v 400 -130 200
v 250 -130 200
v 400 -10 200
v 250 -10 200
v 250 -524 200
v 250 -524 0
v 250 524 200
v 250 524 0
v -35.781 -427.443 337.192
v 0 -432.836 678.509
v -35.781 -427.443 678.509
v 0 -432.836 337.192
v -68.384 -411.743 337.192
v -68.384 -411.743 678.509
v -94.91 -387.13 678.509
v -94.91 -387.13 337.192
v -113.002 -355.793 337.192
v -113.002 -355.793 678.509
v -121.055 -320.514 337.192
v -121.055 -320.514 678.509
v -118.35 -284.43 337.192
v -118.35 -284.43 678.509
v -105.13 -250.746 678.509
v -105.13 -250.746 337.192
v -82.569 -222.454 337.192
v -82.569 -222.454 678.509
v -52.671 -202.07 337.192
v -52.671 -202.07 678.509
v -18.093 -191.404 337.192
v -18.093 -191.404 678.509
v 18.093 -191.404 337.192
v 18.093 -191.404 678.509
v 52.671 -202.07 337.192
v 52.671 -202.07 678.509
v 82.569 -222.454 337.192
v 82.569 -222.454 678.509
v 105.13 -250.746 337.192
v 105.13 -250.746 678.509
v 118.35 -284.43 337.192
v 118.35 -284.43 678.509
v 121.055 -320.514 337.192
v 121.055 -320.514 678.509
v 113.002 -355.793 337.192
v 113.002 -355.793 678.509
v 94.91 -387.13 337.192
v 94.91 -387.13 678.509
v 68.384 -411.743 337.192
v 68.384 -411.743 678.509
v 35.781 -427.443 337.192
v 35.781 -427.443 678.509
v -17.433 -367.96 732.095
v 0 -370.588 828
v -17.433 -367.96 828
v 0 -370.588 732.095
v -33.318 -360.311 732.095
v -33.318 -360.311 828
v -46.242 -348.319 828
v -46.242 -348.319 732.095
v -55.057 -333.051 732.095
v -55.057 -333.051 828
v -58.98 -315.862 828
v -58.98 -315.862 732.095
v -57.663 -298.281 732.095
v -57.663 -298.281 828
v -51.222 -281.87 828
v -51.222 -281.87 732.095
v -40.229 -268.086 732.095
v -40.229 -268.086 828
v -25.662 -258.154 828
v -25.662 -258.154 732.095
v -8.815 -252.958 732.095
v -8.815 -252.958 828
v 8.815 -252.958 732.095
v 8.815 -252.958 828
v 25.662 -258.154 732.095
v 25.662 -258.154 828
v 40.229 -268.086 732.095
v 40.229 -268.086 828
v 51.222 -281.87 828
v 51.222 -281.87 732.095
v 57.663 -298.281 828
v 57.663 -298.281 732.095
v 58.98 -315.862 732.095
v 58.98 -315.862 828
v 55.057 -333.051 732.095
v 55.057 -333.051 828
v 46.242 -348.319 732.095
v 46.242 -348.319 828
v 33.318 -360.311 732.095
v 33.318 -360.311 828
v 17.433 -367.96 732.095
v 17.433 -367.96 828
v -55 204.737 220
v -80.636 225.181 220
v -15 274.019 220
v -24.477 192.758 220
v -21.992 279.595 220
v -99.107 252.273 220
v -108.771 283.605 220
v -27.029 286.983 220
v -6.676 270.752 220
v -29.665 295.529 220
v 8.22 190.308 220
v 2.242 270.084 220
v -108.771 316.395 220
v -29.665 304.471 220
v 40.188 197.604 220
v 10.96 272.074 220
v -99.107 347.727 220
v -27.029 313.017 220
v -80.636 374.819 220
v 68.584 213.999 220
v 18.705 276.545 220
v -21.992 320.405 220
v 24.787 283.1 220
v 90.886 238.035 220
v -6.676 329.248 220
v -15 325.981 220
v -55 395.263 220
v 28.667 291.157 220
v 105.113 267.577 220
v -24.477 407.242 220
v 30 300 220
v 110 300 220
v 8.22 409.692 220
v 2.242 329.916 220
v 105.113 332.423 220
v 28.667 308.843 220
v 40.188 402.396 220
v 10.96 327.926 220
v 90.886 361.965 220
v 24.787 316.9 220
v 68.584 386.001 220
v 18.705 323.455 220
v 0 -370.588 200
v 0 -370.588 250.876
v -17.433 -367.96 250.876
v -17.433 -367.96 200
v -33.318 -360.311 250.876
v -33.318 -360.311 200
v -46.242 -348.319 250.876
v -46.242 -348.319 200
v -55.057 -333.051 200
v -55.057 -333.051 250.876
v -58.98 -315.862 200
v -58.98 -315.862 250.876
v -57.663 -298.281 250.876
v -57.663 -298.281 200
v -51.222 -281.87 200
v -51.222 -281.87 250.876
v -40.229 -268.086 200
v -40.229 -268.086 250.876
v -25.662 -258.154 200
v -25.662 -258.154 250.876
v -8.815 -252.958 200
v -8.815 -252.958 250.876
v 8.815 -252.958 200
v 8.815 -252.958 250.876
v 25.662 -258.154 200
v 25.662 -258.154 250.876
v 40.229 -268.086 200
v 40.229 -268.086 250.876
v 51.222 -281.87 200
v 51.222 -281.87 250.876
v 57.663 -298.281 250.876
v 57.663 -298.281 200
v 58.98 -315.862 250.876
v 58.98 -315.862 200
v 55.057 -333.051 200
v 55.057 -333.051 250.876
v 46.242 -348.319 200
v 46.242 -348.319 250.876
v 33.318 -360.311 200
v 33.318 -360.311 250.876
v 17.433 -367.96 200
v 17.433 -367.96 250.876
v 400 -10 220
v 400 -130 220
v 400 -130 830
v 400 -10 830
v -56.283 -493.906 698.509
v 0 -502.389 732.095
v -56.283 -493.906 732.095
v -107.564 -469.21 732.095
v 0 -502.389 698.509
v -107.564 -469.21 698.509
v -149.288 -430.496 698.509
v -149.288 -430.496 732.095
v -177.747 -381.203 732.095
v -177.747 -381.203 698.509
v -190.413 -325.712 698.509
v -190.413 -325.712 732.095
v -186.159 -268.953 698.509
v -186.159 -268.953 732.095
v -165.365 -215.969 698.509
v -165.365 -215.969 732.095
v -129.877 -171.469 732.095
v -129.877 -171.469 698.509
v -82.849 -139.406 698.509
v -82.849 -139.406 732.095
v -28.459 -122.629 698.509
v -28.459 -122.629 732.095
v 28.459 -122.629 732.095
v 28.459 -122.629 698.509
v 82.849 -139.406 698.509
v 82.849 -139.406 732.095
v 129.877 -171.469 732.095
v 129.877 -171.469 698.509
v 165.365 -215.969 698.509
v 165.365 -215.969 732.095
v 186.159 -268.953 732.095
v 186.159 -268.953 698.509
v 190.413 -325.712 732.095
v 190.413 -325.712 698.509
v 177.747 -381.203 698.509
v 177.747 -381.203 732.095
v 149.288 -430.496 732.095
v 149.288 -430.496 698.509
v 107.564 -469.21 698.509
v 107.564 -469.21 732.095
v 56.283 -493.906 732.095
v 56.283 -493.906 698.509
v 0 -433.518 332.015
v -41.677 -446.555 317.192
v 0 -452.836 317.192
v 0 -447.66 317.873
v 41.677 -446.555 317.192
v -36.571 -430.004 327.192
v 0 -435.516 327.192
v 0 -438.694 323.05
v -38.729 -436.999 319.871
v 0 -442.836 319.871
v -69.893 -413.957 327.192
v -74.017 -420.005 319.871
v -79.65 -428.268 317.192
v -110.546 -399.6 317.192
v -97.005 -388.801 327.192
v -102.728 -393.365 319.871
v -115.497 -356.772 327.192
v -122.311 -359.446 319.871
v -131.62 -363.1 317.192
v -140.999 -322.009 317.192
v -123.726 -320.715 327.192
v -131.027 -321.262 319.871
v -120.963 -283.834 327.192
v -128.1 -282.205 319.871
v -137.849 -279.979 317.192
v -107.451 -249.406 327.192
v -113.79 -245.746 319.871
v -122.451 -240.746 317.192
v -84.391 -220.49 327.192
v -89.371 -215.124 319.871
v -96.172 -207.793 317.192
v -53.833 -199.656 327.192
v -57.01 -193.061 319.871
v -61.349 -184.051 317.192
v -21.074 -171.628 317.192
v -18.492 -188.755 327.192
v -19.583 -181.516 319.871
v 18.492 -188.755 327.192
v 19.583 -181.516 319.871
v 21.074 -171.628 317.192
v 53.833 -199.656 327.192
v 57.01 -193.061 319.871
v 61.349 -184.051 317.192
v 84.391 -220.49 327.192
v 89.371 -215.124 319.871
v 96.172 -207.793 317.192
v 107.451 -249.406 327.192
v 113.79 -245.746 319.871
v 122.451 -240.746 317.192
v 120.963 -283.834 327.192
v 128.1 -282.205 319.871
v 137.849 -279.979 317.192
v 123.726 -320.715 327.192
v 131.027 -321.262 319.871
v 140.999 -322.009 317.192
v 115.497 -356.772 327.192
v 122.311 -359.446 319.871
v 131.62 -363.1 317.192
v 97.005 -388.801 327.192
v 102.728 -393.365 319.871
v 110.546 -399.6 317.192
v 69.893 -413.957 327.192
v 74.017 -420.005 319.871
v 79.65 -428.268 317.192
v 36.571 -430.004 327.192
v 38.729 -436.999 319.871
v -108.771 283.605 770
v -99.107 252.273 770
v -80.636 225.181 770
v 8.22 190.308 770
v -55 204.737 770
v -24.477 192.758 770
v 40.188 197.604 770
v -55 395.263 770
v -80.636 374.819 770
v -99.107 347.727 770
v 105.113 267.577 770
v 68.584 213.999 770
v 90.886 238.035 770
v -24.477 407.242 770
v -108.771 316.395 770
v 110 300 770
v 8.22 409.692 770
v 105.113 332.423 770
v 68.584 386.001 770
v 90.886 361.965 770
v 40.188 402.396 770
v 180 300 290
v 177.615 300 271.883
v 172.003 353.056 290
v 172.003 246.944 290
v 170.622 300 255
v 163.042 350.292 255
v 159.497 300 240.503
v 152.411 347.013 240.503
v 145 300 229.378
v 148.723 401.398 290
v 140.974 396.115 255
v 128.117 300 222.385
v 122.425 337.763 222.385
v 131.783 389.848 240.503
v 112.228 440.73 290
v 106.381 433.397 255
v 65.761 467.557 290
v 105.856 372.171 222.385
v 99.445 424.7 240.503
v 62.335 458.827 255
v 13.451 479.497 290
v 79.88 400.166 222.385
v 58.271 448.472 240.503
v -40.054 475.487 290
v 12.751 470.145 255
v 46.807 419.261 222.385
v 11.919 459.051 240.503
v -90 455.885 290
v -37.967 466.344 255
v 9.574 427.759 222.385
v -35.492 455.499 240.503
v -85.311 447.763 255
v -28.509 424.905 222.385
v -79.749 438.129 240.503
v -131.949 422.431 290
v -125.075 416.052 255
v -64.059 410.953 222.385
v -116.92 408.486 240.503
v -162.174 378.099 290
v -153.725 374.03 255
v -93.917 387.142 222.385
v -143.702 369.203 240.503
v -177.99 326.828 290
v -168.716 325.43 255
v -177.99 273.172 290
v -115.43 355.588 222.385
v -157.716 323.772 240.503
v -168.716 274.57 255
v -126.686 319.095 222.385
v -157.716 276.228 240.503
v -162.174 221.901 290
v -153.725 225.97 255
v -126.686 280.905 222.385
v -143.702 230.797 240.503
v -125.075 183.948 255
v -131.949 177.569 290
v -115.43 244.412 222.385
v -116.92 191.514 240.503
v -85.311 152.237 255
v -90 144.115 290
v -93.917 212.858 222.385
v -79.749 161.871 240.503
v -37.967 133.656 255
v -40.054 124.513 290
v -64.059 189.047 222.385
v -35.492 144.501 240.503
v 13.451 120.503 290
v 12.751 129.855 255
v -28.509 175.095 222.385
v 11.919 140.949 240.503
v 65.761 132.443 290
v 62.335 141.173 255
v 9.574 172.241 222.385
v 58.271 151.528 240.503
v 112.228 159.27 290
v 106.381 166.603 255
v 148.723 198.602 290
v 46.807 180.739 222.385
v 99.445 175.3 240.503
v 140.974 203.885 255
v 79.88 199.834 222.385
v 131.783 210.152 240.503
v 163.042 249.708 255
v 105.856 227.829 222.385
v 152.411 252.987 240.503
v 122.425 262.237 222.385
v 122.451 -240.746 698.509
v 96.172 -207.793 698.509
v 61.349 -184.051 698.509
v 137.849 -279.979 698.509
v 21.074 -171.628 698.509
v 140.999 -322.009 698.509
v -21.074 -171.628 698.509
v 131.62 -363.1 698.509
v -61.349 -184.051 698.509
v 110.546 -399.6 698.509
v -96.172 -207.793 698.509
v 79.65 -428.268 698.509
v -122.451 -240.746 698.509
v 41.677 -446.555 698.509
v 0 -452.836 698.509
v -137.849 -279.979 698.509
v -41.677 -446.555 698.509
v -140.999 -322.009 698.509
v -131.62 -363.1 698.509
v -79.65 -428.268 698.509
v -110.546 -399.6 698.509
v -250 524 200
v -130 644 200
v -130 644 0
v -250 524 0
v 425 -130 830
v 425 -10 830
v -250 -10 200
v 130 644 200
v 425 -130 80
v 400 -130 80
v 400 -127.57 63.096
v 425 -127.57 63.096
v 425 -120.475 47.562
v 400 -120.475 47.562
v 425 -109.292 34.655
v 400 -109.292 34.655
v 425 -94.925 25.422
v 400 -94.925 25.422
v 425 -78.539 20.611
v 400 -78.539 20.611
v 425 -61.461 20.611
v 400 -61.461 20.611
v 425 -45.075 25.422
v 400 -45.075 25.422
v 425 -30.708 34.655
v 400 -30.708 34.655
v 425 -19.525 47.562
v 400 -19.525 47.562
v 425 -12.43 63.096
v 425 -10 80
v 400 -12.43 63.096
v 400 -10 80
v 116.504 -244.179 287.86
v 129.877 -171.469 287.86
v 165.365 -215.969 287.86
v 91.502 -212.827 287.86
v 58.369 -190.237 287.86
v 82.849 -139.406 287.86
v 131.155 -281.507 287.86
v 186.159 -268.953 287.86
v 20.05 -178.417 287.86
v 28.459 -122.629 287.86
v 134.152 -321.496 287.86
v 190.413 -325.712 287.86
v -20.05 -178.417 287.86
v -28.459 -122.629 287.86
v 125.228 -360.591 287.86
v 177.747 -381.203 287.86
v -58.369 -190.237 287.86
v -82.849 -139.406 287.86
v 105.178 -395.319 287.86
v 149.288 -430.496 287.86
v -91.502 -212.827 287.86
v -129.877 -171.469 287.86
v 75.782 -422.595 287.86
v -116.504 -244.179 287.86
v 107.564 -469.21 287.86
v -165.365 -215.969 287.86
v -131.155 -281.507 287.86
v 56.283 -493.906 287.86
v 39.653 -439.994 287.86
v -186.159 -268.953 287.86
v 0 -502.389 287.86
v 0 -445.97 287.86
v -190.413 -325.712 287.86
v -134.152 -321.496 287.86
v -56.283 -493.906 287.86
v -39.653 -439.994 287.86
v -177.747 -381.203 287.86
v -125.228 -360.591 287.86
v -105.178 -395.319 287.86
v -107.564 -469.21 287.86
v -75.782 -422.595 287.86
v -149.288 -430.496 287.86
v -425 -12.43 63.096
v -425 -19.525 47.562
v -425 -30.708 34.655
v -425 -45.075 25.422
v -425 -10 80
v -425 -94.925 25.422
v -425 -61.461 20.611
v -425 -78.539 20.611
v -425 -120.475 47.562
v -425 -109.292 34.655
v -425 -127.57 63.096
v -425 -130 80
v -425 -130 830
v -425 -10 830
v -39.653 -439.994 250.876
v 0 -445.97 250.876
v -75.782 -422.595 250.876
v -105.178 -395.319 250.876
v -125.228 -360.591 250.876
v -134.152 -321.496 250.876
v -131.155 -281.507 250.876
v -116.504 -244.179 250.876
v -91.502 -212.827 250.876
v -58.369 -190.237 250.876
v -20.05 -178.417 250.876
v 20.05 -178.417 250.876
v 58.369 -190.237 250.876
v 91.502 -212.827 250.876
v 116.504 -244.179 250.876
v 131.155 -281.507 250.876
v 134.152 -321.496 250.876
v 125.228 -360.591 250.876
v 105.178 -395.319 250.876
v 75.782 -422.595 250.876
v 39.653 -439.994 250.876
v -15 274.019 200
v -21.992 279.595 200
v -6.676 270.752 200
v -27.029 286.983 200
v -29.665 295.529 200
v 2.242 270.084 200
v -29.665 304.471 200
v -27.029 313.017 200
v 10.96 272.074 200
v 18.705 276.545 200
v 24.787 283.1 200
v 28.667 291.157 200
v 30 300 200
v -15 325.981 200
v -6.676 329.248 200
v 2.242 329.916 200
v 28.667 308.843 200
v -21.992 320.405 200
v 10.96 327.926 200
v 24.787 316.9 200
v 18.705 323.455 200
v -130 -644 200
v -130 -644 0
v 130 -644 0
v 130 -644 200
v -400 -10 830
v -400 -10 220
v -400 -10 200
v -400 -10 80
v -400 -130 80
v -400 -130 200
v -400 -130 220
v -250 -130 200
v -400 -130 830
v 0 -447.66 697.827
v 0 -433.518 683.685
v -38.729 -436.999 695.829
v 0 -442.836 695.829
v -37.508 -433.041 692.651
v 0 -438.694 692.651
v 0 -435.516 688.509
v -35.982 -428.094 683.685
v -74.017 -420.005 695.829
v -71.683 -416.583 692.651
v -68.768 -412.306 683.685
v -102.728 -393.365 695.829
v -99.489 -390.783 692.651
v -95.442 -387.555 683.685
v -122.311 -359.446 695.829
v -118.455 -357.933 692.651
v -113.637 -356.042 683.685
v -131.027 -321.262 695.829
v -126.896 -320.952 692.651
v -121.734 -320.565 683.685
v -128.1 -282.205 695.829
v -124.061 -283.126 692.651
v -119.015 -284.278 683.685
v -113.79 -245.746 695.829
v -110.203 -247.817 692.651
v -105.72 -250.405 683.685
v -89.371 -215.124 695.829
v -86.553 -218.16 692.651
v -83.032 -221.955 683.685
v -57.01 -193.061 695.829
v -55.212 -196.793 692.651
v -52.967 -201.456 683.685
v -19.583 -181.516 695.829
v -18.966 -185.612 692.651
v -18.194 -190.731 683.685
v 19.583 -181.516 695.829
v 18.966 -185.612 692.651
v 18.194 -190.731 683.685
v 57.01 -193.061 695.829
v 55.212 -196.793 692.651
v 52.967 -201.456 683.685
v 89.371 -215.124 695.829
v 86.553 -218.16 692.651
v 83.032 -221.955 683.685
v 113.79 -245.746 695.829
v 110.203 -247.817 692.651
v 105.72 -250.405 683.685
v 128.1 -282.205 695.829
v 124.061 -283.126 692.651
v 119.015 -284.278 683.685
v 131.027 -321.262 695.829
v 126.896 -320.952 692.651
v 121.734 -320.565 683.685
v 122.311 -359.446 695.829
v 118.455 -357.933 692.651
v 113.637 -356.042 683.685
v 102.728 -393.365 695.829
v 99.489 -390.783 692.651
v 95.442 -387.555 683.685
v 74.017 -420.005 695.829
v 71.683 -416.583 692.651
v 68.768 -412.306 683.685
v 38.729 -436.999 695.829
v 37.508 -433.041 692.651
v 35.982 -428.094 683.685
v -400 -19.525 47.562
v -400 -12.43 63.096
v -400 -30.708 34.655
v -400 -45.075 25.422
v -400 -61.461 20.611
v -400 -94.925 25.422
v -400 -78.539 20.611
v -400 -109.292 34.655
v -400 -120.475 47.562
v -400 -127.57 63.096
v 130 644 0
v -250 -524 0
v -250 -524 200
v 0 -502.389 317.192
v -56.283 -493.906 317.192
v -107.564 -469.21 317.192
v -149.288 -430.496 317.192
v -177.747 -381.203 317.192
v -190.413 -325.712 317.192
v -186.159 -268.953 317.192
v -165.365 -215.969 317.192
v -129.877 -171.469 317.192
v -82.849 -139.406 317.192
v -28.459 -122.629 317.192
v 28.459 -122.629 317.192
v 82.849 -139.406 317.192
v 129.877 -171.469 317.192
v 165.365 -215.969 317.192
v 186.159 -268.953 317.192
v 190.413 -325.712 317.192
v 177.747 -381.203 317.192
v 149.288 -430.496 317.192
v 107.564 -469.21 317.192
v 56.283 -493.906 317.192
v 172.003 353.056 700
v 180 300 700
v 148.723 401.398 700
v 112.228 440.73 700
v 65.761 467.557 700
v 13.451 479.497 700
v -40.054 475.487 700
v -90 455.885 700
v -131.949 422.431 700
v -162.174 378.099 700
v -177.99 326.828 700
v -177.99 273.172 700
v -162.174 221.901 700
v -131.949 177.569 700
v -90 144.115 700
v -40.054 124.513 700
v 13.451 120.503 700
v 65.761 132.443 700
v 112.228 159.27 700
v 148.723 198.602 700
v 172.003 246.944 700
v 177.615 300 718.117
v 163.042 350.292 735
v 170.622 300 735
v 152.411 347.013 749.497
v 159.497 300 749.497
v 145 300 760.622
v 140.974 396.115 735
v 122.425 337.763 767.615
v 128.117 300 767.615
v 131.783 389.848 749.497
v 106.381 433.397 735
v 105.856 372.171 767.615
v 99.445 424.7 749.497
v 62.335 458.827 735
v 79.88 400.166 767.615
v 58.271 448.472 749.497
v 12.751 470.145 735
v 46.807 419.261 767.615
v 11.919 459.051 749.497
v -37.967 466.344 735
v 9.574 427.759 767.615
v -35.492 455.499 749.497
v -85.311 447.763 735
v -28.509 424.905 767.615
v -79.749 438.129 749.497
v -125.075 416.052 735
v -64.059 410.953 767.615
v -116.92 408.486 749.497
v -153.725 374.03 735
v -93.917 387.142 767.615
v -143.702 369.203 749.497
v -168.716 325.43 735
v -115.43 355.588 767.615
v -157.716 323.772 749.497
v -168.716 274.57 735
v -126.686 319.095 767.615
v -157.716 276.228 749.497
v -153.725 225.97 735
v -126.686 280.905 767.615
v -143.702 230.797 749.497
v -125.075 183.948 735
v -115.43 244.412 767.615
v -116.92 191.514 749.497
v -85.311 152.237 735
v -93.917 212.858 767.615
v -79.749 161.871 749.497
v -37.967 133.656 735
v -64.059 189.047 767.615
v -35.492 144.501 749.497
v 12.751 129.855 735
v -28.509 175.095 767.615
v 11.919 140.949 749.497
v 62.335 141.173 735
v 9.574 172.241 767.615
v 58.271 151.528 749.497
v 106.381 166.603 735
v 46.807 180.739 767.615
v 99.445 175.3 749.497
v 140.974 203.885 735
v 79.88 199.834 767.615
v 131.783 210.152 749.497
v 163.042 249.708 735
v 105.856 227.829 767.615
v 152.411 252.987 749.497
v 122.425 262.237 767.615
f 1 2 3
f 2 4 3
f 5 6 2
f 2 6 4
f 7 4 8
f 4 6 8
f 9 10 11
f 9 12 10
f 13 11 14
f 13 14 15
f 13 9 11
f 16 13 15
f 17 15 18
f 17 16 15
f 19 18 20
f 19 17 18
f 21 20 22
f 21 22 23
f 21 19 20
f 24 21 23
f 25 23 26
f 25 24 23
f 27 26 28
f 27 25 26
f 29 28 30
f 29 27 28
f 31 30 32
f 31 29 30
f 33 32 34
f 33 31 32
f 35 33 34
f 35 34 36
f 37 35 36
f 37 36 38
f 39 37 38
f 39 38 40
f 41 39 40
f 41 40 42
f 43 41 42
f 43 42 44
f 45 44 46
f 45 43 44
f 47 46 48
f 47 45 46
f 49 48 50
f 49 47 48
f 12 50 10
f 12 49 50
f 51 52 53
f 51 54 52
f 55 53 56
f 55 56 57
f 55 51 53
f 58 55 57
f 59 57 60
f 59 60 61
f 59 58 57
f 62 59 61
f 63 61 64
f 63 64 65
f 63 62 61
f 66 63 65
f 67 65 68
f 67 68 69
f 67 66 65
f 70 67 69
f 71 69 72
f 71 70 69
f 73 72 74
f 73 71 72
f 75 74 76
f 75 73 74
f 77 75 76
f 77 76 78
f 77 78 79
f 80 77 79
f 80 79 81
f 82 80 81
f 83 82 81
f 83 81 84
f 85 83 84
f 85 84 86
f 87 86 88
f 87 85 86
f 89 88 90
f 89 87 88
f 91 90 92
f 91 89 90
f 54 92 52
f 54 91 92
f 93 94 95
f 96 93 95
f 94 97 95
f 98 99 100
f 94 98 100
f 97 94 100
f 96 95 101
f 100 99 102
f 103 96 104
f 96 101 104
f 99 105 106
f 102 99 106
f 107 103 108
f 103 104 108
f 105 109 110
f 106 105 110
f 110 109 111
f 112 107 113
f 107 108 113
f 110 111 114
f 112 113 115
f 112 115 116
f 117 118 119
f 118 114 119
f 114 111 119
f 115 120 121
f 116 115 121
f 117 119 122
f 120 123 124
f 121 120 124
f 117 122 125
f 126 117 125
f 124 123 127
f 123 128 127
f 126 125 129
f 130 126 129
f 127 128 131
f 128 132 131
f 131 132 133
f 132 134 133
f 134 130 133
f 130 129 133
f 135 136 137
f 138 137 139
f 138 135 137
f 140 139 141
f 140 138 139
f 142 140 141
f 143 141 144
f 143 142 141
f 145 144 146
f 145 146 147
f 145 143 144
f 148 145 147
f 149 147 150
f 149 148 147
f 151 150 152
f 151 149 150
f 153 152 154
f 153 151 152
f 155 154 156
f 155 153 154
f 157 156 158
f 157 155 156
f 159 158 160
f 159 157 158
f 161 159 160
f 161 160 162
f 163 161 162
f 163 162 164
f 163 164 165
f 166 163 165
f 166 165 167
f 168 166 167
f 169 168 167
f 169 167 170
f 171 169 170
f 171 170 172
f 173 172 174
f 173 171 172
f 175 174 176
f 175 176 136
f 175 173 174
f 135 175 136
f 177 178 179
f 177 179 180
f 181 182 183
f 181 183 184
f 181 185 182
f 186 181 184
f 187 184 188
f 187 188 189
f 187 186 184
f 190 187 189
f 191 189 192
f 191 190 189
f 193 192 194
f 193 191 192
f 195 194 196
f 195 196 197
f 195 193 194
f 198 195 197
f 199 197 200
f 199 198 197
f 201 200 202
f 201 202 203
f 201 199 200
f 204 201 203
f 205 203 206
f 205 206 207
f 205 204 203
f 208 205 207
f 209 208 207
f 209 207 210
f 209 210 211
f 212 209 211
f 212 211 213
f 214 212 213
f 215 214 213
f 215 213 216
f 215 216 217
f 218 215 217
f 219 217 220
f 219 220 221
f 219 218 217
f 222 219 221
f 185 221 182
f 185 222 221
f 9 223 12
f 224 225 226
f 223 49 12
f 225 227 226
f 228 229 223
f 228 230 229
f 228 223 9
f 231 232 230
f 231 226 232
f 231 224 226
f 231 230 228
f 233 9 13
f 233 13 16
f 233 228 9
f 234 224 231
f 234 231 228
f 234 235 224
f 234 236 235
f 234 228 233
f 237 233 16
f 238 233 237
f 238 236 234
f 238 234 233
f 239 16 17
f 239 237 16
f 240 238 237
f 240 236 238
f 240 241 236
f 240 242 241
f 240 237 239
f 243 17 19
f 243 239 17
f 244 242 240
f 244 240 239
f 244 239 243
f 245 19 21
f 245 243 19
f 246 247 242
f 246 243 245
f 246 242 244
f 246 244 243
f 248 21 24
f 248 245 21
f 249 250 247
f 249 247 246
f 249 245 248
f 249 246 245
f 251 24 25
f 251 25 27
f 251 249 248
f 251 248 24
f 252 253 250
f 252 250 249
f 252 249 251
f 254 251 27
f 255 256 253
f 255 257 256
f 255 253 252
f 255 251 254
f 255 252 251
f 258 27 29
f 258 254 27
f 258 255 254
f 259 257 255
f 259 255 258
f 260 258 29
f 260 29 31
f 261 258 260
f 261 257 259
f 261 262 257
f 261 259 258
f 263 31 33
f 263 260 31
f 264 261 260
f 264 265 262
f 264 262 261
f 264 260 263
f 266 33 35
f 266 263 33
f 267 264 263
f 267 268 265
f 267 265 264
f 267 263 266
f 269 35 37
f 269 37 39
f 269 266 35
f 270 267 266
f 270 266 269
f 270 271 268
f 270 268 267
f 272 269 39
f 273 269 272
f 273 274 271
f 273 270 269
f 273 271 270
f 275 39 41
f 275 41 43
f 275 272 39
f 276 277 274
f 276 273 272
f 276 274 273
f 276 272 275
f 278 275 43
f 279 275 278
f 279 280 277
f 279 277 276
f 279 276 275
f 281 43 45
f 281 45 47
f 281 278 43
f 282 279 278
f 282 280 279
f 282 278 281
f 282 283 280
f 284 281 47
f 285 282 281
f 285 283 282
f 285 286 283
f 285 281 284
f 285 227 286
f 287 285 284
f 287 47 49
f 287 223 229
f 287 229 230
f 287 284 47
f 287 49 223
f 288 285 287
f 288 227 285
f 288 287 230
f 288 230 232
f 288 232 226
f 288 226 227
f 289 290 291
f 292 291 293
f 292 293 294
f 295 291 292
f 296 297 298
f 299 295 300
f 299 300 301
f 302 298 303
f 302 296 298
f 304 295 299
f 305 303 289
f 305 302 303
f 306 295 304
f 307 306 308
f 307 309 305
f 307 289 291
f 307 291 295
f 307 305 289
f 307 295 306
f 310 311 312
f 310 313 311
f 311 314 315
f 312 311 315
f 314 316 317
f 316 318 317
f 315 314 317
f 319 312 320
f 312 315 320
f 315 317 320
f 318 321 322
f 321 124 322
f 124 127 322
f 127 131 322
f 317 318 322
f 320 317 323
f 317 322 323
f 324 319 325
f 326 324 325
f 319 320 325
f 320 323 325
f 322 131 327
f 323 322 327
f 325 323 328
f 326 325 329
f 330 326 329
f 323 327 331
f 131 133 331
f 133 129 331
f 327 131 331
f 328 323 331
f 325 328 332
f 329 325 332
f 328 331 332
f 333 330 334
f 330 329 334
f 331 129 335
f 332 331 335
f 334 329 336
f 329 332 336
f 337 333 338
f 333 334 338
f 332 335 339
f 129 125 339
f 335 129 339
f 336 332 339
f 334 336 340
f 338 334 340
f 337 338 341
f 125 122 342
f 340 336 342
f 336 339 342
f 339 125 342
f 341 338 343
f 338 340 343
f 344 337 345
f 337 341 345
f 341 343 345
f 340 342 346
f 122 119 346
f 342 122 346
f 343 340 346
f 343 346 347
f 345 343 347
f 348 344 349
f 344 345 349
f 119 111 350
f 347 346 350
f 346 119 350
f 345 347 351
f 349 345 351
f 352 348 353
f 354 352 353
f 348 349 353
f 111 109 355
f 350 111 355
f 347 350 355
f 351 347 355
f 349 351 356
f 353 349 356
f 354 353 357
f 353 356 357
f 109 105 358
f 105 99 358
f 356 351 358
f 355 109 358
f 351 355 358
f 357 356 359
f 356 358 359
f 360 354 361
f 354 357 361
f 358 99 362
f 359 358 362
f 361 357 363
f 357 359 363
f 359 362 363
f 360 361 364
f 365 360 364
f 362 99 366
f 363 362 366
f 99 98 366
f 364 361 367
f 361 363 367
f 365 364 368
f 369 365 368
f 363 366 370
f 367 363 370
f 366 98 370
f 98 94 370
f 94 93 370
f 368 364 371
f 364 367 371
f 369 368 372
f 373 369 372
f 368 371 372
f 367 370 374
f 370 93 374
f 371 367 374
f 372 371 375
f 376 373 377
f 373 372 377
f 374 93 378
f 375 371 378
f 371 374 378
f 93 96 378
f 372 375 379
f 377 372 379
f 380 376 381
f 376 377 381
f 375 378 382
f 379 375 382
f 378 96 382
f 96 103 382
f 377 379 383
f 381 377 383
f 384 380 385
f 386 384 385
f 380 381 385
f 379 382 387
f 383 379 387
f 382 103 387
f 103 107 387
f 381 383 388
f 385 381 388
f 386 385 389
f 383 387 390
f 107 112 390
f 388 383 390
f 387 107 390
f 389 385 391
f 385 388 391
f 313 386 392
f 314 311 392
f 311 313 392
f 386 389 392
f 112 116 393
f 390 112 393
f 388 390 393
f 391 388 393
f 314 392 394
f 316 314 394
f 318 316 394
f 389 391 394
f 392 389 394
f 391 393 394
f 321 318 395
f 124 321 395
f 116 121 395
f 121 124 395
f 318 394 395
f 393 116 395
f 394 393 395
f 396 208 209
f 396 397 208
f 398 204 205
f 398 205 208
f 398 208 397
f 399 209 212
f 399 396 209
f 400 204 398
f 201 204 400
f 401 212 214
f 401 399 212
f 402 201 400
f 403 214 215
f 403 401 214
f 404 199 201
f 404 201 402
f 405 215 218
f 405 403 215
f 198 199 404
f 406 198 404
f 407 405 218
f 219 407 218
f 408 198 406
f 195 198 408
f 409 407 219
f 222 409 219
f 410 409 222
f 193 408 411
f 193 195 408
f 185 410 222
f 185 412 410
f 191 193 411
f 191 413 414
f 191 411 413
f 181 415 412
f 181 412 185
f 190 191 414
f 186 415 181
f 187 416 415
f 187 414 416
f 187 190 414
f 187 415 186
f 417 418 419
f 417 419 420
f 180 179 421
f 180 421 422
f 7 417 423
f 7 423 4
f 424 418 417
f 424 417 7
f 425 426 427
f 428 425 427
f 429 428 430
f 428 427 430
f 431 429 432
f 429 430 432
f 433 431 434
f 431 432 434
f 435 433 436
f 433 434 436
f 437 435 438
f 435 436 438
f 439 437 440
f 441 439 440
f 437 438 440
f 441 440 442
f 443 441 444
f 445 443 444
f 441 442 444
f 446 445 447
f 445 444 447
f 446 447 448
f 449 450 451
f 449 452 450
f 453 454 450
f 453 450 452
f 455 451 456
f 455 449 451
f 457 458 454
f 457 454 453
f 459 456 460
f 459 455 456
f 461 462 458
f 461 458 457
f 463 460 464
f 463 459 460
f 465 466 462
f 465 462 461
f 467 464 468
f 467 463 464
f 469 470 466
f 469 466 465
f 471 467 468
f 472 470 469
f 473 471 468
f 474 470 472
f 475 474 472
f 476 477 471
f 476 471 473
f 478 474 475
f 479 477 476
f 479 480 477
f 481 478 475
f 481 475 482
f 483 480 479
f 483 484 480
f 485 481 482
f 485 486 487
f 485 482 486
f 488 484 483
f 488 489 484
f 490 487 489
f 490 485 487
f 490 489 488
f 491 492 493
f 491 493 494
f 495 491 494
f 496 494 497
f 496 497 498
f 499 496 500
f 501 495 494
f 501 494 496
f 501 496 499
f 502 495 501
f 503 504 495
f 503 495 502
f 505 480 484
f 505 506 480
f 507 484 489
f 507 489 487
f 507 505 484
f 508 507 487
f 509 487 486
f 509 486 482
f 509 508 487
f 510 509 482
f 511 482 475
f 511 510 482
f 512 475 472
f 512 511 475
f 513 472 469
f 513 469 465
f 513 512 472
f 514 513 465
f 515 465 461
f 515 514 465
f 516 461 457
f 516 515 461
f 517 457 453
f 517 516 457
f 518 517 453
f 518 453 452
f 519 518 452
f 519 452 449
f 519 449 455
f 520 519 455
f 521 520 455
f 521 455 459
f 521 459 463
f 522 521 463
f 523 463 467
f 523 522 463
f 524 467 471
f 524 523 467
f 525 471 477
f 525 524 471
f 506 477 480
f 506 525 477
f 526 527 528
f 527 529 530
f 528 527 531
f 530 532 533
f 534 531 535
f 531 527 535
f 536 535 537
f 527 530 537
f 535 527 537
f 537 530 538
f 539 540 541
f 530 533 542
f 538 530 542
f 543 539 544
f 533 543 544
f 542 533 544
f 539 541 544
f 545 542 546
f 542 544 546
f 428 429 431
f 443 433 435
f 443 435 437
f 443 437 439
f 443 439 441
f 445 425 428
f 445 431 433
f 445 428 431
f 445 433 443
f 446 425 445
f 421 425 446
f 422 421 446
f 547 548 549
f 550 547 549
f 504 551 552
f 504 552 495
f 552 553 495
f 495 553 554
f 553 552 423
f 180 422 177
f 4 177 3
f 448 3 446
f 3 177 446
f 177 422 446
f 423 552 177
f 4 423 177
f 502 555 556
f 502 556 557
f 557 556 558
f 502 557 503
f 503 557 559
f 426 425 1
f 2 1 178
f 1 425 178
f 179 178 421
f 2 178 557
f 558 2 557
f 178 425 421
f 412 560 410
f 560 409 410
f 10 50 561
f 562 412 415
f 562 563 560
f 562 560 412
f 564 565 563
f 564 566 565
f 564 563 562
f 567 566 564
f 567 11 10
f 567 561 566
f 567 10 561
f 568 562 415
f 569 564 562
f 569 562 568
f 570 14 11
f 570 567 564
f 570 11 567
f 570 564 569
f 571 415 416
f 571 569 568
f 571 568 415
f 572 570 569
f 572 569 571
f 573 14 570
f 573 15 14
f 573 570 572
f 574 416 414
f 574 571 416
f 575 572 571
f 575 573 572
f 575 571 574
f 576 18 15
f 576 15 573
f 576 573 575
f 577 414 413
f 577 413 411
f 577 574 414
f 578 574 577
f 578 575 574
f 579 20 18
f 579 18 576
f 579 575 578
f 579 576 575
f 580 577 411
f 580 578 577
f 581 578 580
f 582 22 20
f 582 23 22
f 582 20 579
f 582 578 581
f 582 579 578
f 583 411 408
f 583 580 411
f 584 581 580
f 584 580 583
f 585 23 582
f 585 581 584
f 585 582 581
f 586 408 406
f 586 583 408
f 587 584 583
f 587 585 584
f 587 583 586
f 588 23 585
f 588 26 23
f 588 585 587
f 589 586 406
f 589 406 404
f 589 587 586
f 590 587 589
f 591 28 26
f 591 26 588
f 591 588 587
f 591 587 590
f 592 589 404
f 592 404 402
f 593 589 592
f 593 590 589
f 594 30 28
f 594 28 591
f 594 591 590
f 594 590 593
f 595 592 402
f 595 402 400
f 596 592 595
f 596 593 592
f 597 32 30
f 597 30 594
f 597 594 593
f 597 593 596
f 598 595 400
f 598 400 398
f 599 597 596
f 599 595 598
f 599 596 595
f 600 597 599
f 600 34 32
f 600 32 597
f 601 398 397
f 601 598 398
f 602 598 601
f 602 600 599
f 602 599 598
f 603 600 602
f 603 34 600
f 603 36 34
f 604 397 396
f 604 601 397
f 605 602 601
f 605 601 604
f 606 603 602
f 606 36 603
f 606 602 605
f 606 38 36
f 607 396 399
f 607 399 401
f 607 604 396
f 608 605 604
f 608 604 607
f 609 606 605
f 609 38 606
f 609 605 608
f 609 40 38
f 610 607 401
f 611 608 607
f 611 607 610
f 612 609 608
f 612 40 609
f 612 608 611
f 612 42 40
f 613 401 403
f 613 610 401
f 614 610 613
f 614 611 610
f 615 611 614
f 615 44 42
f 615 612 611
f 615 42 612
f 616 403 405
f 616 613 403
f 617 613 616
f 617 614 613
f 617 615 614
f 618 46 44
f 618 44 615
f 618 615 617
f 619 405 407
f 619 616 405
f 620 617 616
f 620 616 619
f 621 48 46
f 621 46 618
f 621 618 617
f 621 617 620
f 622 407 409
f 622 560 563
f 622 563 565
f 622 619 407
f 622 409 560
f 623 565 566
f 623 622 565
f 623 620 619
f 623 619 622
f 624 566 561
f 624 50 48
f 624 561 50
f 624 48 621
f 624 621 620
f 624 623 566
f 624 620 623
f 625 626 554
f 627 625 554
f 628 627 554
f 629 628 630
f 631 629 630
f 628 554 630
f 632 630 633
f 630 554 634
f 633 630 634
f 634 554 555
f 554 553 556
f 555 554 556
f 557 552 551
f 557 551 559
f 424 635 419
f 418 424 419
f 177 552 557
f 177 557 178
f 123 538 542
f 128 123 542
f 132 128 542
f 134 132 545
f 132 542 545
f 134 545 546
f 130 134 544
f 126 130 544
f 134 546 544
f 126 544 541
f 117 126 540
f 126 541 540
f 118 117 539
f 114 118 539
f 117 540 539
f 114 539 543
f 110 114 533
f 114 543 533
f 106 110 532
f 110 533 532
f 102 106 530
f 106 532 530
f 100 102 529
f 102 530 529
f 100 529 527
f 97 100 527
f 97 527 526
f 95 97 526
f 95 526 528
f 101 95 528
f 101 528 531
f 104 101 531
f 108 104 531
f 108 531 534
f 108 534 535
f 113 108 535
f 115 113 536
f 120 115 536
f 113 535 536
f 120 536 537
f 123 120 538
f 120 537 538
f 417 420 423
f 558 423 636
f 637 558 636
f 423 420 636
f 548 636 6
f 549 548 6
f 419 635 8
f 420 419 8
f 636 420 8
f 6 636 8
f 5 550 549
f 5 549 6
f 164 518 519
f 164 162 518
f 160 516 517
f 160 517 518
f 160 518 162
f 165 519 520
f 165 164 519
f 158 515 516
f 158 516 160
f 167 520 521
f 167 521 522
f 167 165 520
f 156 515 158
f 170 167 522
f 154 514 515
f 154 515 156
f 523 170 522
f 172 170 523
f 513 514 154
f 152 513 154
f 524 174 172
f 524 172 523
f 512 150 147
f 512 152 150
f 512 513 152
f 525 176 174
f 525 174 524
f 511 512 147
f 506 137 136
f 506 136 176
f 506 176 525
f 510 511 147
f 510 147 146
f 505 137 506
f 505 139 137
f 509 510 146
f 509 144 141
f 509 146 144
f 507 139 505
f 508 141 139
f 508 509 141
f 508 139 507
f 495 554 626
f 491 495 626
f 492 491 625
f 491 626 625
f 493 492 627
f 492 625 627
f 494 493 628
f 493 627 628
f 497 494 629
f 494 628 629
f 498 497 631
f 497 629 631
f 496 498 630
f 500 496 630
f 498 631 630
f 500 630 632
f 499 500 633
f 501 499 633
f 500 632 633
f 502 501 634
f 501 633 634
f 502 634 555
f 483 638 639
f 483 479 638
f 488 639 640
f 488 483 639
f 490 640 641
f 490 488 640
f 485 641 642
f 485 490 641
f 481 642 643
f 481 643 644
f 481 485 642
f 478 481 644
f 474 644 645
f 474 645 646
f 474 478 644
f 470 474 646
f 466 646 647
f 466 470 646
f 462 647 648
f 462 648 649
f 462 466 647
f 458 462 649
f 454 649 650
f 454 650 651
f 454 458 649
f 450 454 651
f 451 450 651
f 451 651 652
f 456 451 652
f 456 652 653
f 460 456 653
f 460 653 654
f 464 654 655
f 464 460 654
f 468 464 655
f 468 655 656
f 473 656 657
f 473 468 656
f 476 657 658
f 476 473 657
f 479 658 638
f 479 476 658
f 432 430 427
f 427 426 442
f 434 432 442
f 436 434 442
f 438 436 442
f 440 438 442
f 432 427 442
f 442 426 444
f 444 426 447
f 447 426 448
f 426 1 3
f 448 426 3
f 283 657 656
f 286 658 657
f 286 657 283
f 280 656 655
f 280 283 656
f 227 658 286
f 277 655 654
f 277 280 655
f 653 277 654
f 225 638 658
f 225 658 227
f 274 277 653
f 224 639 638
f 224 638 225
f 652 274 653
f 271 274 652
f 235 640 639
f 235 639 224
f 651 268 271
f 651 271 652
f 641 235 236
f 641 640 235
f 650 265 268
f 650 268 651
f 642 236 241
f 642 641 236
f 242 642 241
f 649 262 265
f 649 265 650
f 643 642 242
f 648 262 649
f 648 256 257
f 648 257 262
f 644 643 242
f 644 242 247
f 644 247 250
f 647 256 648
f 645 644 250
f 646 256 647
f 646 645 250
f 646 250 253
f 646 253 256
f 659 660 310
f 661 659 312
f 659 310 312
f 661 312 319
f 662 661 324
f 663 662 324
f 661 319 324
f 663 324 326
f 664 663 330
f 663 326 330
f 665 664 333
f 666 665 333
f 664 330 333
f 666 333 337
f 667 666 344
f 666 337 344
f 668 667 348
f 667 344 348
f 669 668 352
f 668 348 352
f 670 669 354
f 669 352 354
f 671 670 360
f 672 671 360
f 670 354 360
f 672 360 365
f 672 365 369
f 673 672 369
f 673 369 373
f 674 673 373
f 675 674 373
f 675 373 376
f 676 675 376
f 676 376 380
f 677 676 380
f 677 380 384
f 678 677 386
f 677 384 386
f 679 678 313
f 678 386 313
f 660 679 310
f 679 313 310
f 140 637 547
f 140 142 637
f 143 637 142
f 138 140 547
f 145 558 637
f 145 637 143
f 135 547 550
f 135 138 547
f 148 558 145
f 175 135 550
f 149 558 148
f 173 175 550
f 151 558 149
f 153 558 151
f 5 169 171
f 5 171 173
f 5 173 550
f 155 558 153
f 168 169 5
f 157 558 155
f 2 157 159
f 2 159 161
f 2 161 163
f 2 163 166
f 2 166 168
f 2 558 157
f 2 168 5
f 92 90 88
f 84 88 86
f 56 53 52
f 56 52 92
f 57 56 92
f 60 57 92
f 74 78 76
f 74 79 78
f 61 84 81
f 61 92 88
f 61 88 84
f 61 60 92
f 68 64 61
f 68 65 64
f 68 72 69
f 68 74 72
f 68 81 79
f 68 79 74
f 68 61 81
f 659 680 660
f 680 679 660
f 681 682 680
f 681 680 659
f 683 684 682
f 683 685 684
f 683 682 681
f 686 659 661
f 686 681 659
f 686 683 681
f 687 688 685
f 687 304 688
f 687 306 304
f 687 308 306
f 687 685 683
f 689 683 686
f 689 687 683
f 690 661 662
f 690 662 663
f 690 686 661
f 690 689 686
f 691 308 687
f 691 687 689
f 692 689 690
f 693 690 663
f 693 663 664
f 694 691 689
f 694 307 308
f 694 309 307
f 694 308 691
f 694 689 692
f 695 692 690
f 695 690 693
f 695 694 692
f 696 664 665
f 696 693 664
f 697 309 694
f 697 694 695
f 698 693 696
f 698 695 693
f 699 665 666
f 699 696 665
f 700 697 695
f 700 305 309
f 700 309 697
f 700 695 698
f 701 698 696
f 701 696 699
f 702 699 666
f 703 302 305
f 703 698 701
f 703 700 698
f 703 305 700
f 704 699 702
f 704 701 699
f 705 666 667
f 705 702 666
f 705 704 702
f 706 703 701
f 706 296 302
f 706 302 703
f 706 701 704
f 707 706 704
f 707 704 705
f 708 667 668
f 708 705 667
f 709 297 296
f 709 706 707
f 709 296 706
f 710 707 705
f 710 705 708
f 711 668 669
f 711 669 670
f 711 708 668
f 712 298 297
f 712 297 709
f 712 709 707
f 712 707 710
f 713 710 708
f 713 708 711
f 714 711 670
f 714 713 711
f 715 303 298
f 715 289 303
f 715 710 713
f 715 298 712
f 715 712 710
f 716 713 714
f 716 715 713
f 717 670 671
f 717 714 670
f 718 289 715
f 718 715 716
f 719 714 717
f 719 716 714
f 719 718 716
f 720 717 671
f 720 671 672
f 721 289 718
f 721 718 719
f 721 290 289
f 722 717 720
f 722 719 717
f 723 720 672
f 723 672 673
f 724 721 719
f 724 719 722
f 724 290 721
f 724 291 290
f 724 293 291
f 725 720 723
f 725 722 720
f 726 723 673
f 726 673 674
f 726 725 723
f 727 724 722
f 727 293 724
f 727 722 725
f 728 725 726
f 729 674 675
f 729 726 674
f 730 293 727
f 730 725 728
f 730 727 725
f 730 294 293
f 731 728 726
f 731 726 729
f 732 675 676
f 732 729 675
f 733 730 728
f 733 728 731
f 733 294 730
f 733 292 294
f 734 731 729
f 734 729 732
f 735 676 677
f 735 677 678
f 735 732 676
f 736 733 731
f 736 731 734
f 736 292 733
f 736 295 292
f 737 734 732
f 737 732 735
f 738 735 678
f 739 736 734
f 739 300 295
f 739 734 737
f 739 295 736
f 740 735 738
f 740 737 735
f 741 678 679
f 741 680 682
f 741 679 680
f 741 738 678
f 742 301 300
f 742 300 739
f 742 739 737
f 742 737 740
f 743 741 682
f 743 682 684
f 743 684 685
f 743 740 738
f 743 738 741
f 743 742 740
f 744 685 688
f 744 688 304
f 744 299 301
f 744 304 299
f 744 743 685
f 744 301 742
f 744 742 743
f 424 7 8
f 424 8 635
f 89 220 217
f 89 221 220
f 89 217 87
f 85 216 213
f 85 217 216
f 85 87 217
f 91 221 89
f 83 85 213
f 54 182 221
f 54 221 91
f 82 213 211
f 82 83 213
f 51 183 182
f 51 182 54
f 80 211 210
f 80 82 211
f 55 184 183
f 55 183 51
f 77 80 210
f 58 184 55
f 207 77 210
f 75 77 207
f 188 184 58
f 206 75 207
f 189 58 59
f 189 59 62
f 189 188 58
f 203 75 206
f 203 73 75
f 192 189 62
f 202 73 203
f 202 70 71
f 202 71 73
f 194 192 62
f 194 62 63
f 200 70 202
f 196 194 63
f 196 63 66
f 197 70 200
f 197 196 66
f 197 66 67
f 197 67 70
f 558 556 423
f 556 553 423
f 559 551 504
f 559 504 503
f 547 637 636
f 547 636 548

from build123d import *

# Parameters (mm, degrees)
F1_DEPTH  = 200
F2_R      = 30
F3_DEPTH  = 20
F4_R      = 180
F4_R_2    = 30
F5_DEPTH  = 550
F6_R      = 70
F9_W      = 150
F9_H      = 120
F9_W_2    = 500
F10_DEPTH = 20
F11_W     = 120
F11_H     = 610
F11_H_2   = 20
F12_DEPTH = 25
F13_W     = 120
F13_H     = 610
F13_H_2   = 20
F14_DEPTH = 25


with BuildPart() as f1:
    # F0 (on Top) → F1 (new body)
    with BuildSketch(Plane.XY):
        Polygon((130, 644), (-130, 644), (-250, 524), (-250, -524), (-130, -644), (130, -644), (250, -524), (250, 524), align=None)
    extrude(amount=F1_DEPTH)

    # F7 (on Right) → F8 (revolve)
    with BuildSketch(Plane.YZ):
        with BuildLine():
            Line((-311.4425307695, 180.1090220129), (-311.4425307695, 828))
            Line((-311.4425307695, 828), (-370.5881640514, 828))
            Line((-370.5881640514, 828), (-370.5881640514, 732.095262214))
            Line((-370.5881640514, 732.095262214), (-454.7894506796, 732.095262214))
            Line((-454.7894506796, 732.095262214), (-502.3891860064, 732.095262214))
            Line((-502.3891860064, 732.095262214), (-502.3891860064, 698.5087530038))
            Line((-502.3891860064, 698.5087530038), (-452.8364729815, 698.5087530038))
            ThreePointArc((-452.8364729815, 698.5087530038), (-438.6943373577, 692.6508886275), (-432.8364729815, 678.5087530038))
            Line((-432.8364729815, 678.5087530038), (-432.8364729814, 337.1917229872))
            ThreePointArc((-432.8364729814, 337.1917229872), (-438.6943373577, 323.0495873634), (-452.8364729814, 317.1917229872))
            Line((-452.8364729814, 317.1917229872), (-502.3891860064, 317.1917229872))
            Line((-502.3891860064, 317.1917229872), (-502.3891860064, 287.8596244668))
            Line((-502.3891860064, 287.8596244668), (-445.9703099532, 287.8596244668))
            Line((-445.9703099532, 287.8596244668), (-445.9703099532, 250.8757300317))
            Line((-445.9703099532, 250.8757300317), (-370.5881640514, 250.8757300317))
            Line((-370.5881640514, 250.8757300317), (-370.5881640514, 175.6325582598))
            Line((-370.5881640514, 175.6325582598), (-311.4425307695, 180.1090220129))
        make_face()
    revolve(axis=Axis((0, -311.4425307695, 504.0545110064), (0, 0, -1)))

    # F9 (on face) → F10 (join)
    with BuildSketch(Plane.XY.offset(200)):
        with Locations((325, -70)):
            Rectangle(F9_W, F9_H)
        with Locations((0, -70)):
            Rectangle(F9_W_2, F9_H)
        with Locations((-325, -70)):
            Rectangle(F9_W, F9_H)
    extrude(amount=F10_DEPTH)

    # F11 (on face) → F12 (join)
    with BuildSketch(Plane.YZ.offset(400)):
        with BuildLine():
            Line((-10, 80), (-10, 200))
            Line((-10, 200), (-130, 200))
            Line((-130, 200), (-130, 80))
            ThreePointArc((-130, 80), (-112.4264068712, 37.5735931288), (-70, 20))
            ThreePointArc((-70, 20), (-27.5735931288, 37.5735931288), (-10, 80))
        make_face()
        with Locations((-70, 525)):
            Rectangle(F11_W, F11_H)
        with Locations((-70, 210)):
            Rectangle(F11_W, F11_H_2)
    extrude(amount=F12_DEPTH)

    # F13 (on face) → F14 (join)
    with BuildSketch(Plane(origin=(-400, 0, 0), x_dir=(0, -1, 0), z_dir=(-1, 0, 0))):
        with Locations((70, 525)):
            Rectangle(F13_W, F13_H)
        with BuildLine():
            Line((130, 200), (10, 200))
            Line((10, 200), (10, 80))
            ThreePointArc((10, 80), (27.5735931288, 37.5735931288), (70, 20))
            ThreePointArc((70, 20), (112.4264068712, 37.5735931288), (130, 80))
            Line((130, 80), (130, 200))
        make_face()
        with Locations((70, 210)):
            Rectangle(F13_W, F13_H_2)
    extrude(amount=F14_DEPTH)


with BuildPart() as f3:
    # F2 (on face) → F3 (new body)
    with BuildSketch(Plane.XY.offset(200)):
        with Locations((0, 300)):
            Circle(F2_R)
    extrude(amount=F3_DEPTH)

    # F4 (on face) → F5 (join)
    with BuildSketch(Plane.XY.offset(220)):
        with Locations((0, 300)):
            Circle(F4_R)
        with Locations((0, 300)):
            Circle(F4_R_2, mode=Mode.SUBTRACT)
        with Locations((0, 300)):
            Circle(F4_R_2)
    extrude(amount=F5_DEPTH)

    # F6
    f6_edges = [f3.edges().sort_by_distance(p)[0] for p in [
        (-180, 300, 770),
        (-180, 300, 220),
    ]]
    fillet(f6_edges, radius=F6_R)


solid = Compound([f1.part, f3.part])
